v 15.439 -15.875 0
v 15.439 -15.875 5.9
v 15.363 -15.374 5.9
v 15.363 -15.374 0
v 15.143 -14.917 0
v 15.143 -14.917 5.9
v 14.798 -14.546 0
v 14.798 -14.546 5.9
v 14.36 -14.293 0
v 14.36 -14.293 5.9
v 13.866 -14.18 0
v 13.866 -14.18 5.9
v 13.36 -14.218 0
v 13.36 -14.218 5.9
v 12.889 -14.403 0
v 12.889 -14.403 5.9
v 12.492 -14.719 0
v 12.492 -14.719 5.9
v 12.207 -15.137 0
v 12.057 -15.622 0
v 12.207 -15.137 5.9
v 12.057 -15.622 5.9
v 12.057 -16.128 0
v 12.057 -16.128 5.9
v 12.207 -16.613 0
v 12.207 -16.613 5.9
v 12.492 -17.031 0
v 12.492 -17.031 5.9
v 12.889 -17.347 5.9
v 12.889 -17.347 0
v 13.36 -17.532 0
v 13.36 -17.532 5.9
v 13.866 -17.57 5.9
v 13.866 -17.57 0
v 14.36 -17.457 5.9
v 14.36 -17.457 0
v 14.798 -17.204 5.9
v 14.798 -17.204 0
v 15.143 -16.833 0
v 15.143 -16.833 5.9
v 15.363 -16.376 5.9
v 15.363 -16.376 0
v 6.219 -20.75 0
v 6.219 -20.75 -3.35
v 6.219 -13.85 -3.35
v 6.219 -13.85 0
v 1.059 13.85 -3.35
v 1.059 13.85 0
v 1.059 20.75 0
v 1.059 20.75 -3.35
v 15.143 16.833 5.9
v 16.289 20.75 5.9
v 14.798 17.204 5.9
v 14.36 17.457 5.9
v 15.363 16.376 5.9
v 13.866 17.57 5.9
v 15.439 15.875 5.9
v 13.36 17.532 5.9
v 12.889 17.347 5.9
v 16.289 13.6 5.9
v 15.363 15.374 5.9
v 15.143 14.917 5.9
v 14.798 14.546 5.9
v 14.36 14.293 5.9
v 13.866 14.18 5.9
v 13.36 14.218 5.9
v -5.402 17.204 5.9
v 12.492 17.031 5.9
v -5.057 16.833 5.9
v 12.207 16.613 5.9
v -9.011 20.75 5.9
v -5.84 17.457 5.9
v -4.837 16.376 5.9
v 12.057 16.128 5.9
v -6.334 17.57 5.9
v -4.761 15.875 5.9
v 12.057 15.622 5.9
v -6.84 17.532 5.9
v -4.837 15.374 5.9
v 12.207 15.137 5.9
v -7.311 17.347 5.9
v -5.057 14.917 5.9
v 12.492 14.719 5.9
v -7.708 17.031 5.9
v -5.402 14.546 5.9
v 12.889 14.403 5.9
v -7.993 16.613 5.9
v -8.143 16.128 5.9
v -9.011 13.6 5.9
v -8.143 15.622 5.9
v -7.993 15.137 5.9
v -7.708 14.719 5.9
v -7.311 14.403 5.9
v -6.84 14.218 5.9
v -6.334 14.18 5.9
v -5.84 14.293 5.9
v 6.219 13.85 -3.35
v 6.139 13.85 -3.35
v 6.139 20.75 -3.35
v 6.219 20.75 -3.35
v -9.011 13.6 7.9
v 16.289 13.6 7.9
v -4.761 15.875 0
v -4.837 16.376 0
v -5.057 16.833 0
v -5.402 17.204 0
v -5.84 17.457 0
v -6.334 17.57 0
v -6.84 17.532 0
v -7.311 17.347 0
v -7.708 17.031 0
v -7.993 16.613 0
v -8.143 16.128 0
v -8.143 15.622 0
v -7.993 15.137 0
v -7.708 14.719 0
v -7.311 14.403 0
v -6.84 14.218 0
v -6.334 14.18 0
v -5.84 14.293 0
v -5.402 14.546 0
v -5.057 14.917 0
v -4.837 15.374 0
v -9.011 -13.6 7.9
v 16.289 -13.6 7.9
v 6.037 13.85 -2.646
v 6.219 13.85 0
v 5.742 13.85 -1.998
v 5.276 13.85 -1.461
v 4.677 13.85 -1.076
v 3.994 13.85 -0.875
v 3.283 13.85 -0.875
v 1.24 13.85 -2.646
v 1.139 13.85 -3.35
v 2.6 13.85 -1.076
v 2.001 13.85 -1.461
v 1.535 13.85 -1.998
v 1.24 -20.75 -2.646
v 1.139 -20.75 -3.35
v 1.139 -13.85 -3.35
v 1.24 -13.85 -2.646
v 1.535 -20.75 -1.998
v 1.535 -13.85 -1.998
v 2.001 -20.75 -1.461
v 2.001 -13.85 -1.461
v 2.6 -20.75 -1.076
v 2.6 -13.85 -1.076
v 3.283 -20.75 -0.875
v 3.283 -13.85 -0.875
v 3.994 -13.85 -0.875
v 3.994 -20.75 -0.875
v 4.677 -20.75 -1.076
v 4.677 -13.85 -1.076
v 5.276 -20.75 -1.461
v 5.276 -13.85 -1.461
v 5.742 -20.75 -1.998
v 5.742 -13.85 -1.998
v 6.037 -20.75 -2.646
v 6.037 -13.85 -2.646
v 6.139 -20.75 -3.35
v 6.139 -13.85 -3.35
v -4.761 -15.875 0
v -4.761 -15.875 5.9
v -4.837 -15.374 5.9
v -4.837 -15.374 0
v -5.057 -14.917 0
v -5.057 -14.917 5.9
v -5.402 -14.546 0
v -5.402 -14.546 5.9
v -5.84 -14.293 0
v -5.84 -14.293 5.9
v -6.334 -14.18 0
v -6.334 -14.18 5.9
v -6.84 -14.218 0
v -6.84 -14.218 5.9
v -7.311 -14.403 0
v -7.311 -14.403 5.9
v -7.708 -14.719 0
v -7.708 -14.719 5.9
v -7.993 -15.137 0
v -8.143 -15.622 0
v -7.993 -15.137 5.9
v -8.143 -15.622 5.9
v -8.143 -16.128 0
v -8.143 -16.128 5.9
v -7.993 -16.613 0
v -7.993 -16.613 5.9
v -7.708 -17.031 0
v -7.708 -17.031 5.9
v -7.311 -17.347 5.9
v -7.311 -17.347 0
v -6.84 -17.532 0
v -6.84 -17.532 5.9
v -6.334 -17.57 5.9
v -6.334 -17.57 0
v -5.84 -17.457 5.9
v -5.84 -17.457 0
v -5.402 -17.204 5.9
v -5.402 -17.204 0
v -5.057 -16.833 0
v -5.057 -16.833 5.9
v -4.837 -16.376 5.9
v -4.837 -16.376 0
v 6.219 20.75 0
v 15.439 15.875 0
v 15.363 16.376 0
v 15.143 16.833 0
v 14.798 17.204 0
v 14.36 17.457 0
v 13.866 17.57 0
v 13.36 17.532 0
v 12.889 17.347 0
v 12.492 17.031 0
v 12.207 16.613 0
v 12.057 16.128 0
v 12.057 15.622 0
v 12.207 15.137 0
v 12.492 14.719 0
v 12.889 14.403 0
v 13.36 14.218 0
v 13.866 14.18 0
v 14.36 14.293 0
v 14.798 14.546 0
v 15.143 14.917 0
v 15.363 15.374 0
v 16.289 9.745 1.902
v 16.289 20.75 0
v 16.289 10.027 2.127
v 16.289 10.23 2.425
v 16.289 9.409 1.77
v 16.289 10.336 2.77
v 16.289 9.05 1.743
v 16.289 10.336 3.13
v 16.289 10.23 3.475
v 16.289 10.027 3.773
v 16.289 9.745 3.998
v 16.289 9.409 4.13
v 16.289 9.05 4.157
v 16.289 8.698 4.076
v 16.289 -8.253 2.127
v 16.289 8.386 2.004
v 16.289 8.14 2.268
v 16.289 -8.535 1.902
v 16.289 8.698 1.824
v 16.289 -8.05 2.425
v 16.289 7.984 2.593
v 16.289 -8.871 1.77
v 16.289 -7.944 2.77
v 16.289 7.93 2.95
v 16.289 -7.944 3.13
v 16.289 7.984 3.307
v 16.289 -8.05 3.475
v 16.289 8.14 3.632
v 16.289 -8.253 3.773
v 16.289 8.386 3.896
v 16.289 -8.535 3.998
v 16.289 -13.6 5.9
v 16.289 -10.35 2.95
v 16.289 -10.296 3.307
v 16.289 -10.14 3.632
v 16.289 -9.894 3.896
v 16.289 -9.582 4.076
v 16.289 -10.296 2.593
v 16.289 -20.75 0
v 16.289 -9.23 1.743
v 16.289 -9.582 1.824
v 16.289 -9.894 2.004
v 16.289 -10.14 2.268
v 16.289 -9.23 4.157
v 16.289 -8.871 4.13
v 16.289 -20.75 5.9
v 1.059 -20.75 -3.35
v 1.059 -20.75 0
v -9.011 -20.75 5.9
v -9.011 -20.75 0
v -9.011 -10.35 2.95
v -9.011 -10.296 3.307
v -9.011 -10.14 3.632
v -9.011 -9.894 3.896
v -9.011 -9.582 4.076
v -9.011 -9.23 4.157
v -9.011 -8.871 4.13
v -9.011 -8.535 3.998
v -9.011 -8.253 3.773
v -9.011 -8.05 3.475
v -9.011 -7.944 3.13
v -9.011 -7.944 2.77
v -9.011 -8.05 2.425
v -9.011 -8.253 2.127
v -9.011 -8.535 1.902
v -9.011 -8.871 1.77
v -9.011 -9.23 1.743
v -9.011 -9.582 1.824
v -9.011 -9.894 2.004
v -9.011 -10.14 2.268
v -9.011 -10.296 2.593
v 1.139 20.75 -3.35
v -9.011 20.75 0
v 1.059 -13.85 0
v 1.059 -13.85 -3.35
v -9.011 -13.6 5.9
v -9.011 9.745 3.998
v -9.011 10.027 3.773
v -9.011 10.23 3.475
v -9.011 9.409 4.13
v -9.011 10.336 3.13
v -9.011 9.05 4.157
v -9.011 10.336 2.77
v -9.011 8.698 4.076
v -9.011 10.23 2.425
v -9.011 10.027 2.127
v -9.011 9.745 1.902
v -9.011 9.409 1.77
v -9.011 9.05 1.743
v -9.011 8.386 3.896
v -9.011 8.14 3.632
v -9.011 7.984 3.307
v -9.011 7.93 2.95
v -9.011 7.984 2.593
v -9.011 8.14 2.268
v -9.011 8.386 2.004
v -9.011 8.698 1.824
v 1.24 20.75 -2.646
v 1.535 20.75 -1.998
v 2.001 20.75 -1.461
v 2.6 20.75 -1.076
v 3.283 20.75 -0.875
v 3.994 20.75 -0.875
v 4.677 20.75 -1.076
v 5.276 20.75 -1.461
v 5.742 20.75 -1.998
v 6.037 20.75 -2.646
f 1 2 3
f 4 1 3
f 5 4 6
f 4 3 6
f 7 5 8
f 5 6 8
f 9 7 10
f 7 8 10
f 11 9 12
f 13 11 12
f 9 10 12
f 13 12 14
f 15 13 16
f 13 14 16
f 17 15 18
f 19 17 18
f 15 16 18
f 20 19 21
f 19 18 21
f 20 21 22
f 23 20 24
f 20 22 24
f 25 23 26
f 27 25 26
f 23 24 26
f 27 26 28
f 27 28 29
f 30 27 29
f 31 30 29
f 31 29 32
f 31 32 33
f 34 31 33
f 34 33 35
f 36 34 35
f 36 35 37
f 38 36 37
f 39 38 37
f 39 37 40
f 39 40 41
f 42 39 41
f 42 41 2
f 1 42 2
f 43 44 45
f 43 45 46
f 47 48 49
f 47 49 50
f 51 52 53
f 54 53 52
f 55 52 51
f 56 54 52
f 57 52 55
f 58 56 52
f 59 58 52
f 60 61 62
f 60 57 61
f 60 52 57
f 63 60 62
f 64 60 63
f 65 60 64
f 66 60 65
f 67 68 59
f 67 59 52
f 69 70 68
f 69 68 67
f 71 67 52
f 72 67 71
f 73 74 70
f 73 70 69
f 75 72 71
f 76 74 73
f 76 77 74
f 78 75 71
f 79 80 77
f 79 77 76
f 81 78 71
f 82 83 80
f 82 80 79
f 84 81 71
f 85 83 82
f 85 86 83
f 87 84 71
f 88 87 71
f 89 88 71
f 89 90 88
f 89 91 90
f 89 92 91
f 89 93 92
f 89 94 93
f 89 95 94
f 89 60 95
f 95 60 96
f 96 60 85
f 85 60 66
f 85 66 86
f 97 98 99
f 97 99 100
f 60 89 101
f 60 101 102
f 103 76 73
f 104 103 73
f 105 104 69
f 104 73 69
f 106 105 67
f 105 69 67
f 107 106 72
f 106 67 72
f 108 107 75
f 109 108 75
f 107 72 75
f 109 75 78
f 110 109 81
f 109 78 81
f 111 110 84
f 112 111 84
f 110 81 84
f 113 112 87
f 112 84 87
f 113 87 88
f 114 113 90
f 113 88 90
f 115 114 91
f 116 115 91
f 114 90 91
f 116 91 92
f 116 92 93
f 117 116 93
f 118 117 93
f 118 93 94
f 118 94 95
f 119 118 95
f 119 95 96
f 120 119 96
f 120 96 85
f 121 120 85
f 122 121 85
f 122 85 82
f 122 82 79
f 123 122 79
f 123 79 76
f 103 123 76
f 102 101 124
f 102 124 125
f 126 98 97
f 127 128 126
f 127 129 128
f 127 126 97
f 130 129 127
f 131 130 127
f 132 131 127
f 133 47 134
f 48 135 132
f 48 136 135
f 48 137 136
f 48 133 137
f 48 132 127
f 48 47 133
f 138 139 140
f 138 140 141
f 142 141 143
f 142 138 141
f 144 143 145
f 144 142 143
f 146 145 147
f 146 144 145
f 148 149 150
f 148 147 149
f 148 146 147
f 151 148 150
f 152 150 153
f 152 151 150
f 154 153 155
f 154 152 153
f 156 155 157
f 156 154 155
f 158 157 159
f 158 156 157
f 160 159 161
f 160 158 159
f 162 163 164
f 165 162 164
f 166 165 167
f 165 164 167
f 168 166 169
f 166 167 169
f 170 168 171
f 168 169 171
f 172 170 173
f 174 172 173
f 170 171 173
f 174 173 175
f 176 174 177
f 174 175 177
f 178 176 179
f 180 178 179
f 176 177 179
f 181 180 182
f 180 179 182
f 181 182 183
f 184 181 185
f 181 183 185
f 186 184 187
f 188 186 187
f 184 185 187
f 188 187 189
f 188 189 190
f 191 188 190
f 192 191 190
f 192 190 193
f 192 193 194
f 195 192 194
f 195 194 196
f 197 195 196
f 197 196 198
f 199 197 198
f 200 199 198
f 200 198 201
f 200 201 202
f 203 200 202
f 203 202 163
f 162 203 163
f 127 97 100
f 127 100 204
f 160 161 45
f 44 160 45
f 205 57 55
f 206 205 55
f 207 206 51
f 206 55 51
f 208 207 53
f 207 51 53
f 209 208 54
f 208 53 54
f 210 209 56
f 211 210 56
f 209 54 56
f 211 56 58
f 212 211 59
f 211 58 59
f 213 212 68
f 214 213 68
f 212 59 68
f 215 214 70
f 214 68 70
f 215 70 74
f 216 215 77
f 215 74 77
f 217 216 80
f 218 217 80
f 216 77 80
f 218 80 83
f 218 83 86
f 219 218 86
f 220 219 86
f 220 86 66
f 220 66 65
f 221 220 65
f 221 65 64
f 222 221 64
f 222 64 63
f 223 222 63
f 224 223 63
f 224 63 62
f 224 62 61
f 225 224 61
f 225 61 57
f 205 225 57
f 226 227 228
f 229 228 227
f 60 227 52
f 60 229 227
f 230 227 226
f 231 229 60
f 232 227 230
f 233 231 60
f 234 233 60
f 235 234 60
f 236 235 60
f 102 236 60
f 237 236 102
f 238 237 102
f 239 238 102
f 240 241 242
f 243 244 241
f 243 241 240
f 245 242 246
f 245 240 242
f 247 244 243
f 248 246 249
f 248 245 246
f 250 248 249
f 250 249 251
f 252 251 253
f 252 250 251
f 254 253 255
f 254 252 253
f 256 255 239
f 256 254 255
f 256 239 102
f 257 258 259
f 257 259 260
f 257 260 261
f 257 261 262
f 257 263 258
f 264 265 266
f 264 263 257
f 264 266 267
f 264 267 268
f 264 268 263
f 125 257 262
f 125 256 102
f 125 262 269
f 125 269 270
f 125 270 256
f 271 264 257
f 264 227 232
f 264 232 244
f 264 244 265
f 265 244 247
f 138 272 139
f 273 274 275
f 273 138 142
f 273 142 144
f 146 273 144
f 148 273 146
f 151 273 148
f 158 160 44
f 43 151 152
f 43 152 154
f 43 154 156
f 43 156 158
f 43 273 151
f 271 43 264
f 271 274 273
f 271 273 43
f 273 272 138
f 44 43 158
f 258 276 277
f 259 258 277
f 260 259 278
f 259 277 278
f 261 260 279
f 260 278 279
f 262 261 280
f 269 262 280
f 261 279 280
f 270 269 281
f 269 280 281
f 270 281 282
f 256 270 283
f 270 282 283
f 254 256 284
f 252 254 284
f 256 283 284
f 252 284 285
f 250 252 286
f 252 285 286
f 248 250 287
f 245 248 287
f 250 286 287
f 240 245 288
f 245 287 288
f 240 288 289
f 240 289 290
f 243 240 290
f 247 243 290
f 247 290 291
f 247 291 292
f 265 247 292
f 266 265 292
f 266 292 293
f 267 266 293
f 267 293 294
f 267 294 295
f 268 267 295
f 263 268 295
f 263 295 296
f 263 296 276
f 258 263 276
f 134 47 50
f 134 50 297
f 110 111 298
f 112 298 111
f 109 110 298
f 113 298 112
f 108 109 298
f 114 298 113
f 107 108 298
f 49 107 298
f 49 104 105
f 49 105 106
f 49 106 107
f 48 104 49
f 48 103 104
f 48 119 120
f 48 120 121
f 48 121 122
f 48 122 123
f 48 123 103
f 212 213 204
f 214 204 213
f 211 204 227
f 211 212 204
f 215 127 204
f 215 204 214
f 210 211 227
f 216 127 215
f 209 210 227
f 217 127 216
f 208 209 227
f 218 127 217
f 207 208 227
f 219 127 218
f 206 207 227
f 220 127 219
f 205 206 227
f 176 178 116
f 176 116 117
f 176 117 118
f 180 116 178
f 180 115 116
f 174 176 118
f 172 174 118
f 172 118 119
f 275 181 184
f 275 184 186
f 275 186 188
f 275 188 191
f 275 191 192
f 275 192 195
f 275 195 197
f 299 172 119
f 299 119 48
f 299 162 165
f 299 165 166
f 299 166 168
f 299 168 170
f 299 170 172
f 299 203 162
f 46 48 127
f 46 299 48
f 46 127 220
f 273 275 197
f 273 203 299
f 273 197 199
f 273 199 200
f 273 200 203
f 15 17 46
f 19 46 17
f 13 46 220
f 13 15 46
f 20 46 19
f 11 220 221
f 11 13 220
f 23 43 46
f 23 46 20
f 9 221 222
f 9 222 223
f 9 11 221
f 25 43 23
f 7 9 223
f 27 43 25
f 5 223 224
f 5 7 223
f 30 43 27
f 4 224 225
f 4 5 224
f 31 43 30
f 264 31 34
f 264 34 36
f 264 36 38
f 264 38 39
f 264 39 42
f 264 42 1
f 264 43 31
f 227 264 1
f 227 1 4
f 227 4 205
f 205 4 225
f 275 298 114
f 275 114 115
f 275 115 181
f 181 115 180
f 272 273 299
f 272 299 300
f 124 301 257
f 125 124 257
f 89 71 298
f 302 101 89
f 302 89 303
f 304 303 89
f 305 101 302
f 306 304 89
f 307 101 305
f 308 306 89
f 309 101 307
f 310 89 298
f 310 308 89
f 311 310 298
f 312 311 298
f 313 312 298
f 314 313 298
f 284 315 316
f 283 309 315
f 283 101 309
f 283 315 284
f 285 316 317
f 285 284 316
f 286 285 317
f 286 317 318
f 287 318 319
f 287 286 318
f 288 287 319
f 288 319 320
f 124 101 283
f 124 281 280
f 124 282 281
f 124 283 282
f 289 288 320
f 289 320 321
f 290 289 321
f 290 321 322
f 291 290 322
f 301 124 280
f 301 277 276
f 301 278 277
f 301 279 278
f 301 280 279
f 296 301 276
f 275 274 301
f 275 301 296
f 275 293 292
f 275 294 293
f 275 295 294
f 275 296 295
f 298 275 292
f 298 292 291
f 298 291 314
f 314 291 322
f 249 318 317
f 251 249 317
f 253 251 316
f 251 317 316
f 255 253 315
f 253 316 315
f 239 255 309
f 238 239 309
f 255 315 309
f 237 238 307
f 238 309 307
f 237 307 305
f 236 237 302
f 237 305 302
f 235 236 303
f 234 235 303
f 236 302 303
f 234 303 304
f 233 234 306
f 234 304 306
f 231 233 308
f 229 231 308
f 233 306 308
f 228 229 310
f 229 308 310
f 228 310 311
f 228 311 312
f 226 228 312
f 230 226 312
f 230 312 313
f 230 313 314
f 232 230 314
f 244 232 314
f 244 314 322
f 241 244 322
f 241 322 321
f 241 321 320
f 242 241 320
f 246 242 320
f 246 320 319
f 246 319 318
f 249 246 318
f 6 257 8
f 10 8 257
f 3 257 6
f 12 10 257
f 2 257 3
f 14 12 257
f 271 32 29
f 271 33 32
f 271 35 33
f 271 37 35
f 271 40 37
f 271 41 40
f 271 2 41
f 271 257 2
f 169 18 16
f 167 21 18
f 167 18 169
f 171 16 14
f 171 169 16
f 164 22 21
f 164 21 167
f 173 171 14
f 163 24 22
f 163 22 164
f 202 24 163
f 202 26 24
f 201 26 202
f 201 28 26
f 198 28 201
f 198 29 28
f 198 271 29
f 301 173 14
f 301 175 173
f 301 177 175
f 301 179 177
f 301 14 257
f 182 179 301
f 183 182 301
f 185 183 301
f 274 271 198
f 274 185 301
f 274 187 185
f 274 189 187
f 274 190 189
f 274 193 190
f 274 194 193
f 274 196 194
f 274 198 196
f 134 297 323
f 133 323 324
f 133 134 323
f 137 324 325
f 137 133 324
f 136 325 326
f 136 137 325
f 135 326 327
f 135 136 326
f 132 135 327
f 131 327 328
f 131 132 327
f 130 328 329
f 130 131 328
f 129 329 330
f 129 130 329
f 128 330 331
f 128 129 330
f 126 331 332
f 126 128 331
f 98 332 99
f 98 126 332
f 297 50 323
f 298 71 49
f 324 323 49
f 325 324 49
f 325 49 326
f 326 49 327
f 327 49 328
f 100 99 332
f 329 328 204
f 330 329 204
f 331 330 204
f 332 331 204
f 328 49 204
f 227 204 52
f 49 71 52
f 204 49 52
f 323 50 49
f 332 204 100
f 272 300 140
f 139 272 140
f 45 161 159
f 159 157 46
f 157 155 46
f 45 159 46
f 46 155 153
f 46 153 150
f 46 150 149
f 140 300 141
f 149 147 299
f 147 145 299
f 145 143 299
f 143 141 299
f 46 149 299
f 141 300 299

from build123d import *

# Parameters (mm, degrees)
F1_DEPTH = 20.75
F2_W     = 25.3
F2_H     = 27.2
F3_DEPTH = 2
F2_R     = 1.7
F4_DEPTH = 9.251
F5_W     = 27.7
F5_H     = 3.35
F5_R     = 1.21
F6_DEPTH = 25.301


with BuildPart() as f1:
    # F0 (on Front) → F1 (new body, symmetric)
    with BuildSketch(Plane.XZ):
        Polygon((16.2885056366, 5.9), (-9.0114943634, 5.9), (-9.0114943634, 0), (1.0585056366, 0), (6.2185056366, 0), (16.2885056366, 0), align=None)
        with BuildLine():
            Line((6.2185056366, 0), (1.0585056366, 0))
            Line((1.0585056366, 0), (1.0585056366, -3.35))
            Line((1.0585056366, -3.35), (1.1385056366, -3.35))
            ThreePointArc((1.1385056366, -3.35), (3.6385056366, -0.85), (6.1385056366, -3.35))
            Line((6.1385056366, -3.35), (6.2185056366, -3.35))
            Line((6.2185056366, -3.35), (6.2185056366, 0))
        make_face()
    extrude(amount=F1_DEPTH, both=True)

    # F2 (on face) → F3 (join)
    with BuildSketch(Plane.XY.offset(5.9)):
        with Locations((3.6385056366, 0)):
            Rectangle(F2_W, F2_H)
    extrude(amount=F3_DEPTH)

    # F2 (on face) → F4 (cut, through all)
    with BuildSketch(Plane.XY.offset(5.9)):
        with Locations((13.7385056366, 15.875)):
            Circle(F2_R)
        with Locations((-6.4614943634, 15.875)):
            Circle(F2_R)
        with Locations((-6.4614943634, -15.875)):
            Circle(F2_R)
        with Locations((13.7385056366, -15.875)):
            Circle(F2_R)
    extrude(amount=-F4_DEPTH, mode=Mode.SUBTRACT)

    # F5 (on face) → F6 (cut, through all)
    with BuildSketch(Plane(origin=(-9.0114943634, 0, 0), x_dir=(0, -1, 0), z_dir=(-1, 0, 0))):
        with Locations((0, -1.675)):
            Rectangle(F5_W, F5_H)
        with Locations((9.14, 2.95)):
            Circle(F5_R)
        with Locations((-9.14, 2.95)):
            Circle(F5_R)
    extrude(amount=-F6_DEPTH, mode=Mode.SUBTRACT)


solid = f1.part
